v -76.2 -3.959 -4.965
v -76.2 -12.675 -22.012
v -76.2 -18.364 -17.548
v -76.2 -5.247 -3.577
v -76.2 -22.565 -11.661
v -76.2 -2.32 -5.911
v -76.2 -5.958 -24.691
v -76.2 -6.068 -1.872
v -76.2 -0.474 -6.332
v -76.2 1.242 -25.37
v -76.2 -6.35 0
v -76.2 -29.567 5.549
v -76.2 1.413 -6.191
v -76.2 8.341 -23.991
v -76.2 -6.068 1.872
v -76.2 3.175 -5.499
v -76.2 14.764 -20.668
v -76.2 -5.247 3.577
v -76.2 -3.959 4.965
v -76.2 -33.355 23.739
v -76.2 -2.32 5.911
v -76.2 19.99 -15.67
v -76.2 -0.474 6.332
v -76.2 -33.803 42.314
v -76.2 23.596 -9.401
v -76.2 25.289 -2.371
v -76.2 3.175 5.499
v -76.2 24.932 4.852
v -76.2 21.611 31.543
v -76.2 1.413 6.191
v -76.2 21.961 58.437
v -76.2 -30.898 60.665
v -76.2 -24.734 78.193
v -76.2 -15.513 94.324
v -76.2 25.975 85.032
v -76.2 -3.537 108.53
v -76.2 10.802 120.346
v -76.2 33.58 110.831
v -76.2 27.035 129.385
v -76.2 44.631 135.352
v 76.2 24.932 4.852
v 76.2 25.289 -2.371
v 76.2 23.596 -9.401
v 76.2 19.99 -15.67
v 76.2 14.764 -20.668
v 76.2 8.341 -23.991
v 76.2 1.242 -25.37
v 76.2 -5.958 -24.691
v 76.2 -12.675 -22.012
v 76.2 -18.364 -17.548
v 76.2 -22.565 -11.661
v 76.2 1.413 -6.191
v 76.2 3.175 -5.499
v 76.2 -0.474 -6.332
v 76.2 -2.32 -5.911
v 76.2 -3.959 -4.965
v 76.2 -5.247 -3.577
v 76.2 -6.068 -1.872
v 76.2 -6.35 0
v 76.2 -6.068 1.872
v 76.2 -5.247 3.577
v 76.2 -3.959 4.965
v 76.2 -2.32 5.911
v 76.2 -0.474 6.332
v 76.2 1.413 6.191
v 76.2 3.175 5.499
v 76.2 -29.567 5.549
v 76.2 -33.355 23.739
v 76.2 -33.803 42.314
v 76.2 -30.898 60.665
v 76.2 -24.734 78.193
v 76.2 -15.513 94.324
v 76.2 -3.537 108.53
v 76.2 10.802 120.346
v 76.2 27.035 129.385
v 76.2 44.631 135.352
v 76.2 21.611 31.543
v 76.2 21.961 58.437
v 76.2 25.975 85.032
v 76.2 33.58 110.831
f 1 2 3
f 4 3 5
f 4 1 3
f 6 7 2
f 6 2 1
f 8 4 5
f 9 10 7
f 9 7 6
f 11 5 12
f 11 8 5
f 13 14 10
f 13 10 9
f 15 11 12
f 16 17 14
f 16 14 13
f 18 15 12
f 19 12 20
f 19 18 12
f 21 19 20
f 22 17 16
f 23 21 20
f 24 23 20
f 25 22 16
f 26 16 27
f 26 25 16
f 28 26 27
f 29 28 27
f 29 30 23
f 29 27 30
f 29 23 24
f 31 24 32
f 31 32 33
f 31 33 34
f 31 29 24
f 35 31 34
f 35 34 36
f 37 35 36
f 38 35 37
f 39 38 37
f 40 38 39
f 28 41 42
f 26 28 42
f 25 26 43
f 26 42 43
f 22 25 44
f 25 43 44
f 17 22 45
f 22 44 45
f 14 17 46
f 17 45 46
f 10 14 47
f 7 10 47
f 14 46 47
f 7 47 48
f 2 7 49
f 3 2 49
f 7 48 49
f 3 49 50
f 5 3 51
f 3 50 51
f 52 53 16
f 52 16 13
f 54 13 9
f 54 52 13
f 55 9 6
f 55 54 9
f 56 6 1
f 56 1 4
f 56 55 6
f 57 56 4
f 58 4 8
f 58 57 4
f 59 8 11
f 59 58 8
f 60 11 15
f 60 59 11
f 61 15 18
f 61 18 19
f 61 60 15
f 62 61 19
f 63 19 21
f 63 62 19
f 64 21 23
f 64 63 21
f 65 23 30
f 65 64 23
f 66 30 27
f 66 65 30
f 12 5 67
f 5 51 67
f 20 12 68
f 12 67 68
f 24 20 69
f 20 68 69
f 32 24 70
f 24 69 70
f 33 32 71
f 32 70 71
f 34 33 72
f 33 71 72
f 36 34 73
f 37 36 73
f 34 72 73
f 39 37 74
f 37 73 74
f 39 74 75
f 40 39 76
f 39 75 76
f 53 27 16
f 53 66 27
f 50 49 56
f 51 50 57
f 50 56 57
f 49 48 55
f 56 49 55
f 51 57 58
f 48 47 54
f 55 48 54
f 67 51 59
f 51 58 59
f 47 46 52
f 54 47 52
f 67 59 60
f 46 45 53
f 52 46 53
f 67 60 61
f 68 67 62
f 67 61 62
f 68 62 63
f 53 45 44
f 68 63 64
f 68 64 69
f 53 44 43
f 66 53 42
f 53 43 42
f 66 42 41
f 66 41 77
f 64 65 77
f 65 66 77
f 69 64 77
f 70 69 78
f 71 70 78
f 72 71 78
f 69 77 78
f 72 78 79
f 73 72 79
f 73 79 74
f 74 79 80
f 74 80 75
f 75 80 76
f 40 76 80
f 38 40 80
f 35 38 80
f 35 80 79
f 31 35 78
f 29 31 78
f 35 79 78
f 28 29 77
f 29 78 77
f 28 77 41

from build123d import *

# Parameters (mm, degrees)
BOSS_EXTRUDE1_DEPTH = 76.2


with BuildPart() as part:
    # Sketch1 → Boss-Extrude1 (new, symmetric)
    with BuildSketch(Plane(origin=(0, 0, 0), x_dir=(0, 0, -1), z_dir=(1, 0, 0))):
        with BuildLine():
            ThreePointArc((-4.852064404, 24.93225764), (23.991364551, 8.341128638), (11.661357948, -22.5648561))
            ThreePointArc((11.661357948, -22.5648561), (-78.193446496, -24.733850104), (-135.351657349, 44.631338202))
            ThreePointArc((-135.351657349, 44.631338202), (-71.80288322, 23.513113441), (-4.852064404, 24.93225764))
        make_face()
        with BuildLine():
            Line((-5.4991, 3.175279388), (5.4991, 3.175279388))
            ThreePointArc((5.4991, 3.175279388), (0, -6.35), (-5.4991, 3.175279388))
        make_face(mode=Mode.SUBTRACT)
    extrude(amount=BOSS_EXTRUDE1_DEPTH, both=True)


solid = part.part
